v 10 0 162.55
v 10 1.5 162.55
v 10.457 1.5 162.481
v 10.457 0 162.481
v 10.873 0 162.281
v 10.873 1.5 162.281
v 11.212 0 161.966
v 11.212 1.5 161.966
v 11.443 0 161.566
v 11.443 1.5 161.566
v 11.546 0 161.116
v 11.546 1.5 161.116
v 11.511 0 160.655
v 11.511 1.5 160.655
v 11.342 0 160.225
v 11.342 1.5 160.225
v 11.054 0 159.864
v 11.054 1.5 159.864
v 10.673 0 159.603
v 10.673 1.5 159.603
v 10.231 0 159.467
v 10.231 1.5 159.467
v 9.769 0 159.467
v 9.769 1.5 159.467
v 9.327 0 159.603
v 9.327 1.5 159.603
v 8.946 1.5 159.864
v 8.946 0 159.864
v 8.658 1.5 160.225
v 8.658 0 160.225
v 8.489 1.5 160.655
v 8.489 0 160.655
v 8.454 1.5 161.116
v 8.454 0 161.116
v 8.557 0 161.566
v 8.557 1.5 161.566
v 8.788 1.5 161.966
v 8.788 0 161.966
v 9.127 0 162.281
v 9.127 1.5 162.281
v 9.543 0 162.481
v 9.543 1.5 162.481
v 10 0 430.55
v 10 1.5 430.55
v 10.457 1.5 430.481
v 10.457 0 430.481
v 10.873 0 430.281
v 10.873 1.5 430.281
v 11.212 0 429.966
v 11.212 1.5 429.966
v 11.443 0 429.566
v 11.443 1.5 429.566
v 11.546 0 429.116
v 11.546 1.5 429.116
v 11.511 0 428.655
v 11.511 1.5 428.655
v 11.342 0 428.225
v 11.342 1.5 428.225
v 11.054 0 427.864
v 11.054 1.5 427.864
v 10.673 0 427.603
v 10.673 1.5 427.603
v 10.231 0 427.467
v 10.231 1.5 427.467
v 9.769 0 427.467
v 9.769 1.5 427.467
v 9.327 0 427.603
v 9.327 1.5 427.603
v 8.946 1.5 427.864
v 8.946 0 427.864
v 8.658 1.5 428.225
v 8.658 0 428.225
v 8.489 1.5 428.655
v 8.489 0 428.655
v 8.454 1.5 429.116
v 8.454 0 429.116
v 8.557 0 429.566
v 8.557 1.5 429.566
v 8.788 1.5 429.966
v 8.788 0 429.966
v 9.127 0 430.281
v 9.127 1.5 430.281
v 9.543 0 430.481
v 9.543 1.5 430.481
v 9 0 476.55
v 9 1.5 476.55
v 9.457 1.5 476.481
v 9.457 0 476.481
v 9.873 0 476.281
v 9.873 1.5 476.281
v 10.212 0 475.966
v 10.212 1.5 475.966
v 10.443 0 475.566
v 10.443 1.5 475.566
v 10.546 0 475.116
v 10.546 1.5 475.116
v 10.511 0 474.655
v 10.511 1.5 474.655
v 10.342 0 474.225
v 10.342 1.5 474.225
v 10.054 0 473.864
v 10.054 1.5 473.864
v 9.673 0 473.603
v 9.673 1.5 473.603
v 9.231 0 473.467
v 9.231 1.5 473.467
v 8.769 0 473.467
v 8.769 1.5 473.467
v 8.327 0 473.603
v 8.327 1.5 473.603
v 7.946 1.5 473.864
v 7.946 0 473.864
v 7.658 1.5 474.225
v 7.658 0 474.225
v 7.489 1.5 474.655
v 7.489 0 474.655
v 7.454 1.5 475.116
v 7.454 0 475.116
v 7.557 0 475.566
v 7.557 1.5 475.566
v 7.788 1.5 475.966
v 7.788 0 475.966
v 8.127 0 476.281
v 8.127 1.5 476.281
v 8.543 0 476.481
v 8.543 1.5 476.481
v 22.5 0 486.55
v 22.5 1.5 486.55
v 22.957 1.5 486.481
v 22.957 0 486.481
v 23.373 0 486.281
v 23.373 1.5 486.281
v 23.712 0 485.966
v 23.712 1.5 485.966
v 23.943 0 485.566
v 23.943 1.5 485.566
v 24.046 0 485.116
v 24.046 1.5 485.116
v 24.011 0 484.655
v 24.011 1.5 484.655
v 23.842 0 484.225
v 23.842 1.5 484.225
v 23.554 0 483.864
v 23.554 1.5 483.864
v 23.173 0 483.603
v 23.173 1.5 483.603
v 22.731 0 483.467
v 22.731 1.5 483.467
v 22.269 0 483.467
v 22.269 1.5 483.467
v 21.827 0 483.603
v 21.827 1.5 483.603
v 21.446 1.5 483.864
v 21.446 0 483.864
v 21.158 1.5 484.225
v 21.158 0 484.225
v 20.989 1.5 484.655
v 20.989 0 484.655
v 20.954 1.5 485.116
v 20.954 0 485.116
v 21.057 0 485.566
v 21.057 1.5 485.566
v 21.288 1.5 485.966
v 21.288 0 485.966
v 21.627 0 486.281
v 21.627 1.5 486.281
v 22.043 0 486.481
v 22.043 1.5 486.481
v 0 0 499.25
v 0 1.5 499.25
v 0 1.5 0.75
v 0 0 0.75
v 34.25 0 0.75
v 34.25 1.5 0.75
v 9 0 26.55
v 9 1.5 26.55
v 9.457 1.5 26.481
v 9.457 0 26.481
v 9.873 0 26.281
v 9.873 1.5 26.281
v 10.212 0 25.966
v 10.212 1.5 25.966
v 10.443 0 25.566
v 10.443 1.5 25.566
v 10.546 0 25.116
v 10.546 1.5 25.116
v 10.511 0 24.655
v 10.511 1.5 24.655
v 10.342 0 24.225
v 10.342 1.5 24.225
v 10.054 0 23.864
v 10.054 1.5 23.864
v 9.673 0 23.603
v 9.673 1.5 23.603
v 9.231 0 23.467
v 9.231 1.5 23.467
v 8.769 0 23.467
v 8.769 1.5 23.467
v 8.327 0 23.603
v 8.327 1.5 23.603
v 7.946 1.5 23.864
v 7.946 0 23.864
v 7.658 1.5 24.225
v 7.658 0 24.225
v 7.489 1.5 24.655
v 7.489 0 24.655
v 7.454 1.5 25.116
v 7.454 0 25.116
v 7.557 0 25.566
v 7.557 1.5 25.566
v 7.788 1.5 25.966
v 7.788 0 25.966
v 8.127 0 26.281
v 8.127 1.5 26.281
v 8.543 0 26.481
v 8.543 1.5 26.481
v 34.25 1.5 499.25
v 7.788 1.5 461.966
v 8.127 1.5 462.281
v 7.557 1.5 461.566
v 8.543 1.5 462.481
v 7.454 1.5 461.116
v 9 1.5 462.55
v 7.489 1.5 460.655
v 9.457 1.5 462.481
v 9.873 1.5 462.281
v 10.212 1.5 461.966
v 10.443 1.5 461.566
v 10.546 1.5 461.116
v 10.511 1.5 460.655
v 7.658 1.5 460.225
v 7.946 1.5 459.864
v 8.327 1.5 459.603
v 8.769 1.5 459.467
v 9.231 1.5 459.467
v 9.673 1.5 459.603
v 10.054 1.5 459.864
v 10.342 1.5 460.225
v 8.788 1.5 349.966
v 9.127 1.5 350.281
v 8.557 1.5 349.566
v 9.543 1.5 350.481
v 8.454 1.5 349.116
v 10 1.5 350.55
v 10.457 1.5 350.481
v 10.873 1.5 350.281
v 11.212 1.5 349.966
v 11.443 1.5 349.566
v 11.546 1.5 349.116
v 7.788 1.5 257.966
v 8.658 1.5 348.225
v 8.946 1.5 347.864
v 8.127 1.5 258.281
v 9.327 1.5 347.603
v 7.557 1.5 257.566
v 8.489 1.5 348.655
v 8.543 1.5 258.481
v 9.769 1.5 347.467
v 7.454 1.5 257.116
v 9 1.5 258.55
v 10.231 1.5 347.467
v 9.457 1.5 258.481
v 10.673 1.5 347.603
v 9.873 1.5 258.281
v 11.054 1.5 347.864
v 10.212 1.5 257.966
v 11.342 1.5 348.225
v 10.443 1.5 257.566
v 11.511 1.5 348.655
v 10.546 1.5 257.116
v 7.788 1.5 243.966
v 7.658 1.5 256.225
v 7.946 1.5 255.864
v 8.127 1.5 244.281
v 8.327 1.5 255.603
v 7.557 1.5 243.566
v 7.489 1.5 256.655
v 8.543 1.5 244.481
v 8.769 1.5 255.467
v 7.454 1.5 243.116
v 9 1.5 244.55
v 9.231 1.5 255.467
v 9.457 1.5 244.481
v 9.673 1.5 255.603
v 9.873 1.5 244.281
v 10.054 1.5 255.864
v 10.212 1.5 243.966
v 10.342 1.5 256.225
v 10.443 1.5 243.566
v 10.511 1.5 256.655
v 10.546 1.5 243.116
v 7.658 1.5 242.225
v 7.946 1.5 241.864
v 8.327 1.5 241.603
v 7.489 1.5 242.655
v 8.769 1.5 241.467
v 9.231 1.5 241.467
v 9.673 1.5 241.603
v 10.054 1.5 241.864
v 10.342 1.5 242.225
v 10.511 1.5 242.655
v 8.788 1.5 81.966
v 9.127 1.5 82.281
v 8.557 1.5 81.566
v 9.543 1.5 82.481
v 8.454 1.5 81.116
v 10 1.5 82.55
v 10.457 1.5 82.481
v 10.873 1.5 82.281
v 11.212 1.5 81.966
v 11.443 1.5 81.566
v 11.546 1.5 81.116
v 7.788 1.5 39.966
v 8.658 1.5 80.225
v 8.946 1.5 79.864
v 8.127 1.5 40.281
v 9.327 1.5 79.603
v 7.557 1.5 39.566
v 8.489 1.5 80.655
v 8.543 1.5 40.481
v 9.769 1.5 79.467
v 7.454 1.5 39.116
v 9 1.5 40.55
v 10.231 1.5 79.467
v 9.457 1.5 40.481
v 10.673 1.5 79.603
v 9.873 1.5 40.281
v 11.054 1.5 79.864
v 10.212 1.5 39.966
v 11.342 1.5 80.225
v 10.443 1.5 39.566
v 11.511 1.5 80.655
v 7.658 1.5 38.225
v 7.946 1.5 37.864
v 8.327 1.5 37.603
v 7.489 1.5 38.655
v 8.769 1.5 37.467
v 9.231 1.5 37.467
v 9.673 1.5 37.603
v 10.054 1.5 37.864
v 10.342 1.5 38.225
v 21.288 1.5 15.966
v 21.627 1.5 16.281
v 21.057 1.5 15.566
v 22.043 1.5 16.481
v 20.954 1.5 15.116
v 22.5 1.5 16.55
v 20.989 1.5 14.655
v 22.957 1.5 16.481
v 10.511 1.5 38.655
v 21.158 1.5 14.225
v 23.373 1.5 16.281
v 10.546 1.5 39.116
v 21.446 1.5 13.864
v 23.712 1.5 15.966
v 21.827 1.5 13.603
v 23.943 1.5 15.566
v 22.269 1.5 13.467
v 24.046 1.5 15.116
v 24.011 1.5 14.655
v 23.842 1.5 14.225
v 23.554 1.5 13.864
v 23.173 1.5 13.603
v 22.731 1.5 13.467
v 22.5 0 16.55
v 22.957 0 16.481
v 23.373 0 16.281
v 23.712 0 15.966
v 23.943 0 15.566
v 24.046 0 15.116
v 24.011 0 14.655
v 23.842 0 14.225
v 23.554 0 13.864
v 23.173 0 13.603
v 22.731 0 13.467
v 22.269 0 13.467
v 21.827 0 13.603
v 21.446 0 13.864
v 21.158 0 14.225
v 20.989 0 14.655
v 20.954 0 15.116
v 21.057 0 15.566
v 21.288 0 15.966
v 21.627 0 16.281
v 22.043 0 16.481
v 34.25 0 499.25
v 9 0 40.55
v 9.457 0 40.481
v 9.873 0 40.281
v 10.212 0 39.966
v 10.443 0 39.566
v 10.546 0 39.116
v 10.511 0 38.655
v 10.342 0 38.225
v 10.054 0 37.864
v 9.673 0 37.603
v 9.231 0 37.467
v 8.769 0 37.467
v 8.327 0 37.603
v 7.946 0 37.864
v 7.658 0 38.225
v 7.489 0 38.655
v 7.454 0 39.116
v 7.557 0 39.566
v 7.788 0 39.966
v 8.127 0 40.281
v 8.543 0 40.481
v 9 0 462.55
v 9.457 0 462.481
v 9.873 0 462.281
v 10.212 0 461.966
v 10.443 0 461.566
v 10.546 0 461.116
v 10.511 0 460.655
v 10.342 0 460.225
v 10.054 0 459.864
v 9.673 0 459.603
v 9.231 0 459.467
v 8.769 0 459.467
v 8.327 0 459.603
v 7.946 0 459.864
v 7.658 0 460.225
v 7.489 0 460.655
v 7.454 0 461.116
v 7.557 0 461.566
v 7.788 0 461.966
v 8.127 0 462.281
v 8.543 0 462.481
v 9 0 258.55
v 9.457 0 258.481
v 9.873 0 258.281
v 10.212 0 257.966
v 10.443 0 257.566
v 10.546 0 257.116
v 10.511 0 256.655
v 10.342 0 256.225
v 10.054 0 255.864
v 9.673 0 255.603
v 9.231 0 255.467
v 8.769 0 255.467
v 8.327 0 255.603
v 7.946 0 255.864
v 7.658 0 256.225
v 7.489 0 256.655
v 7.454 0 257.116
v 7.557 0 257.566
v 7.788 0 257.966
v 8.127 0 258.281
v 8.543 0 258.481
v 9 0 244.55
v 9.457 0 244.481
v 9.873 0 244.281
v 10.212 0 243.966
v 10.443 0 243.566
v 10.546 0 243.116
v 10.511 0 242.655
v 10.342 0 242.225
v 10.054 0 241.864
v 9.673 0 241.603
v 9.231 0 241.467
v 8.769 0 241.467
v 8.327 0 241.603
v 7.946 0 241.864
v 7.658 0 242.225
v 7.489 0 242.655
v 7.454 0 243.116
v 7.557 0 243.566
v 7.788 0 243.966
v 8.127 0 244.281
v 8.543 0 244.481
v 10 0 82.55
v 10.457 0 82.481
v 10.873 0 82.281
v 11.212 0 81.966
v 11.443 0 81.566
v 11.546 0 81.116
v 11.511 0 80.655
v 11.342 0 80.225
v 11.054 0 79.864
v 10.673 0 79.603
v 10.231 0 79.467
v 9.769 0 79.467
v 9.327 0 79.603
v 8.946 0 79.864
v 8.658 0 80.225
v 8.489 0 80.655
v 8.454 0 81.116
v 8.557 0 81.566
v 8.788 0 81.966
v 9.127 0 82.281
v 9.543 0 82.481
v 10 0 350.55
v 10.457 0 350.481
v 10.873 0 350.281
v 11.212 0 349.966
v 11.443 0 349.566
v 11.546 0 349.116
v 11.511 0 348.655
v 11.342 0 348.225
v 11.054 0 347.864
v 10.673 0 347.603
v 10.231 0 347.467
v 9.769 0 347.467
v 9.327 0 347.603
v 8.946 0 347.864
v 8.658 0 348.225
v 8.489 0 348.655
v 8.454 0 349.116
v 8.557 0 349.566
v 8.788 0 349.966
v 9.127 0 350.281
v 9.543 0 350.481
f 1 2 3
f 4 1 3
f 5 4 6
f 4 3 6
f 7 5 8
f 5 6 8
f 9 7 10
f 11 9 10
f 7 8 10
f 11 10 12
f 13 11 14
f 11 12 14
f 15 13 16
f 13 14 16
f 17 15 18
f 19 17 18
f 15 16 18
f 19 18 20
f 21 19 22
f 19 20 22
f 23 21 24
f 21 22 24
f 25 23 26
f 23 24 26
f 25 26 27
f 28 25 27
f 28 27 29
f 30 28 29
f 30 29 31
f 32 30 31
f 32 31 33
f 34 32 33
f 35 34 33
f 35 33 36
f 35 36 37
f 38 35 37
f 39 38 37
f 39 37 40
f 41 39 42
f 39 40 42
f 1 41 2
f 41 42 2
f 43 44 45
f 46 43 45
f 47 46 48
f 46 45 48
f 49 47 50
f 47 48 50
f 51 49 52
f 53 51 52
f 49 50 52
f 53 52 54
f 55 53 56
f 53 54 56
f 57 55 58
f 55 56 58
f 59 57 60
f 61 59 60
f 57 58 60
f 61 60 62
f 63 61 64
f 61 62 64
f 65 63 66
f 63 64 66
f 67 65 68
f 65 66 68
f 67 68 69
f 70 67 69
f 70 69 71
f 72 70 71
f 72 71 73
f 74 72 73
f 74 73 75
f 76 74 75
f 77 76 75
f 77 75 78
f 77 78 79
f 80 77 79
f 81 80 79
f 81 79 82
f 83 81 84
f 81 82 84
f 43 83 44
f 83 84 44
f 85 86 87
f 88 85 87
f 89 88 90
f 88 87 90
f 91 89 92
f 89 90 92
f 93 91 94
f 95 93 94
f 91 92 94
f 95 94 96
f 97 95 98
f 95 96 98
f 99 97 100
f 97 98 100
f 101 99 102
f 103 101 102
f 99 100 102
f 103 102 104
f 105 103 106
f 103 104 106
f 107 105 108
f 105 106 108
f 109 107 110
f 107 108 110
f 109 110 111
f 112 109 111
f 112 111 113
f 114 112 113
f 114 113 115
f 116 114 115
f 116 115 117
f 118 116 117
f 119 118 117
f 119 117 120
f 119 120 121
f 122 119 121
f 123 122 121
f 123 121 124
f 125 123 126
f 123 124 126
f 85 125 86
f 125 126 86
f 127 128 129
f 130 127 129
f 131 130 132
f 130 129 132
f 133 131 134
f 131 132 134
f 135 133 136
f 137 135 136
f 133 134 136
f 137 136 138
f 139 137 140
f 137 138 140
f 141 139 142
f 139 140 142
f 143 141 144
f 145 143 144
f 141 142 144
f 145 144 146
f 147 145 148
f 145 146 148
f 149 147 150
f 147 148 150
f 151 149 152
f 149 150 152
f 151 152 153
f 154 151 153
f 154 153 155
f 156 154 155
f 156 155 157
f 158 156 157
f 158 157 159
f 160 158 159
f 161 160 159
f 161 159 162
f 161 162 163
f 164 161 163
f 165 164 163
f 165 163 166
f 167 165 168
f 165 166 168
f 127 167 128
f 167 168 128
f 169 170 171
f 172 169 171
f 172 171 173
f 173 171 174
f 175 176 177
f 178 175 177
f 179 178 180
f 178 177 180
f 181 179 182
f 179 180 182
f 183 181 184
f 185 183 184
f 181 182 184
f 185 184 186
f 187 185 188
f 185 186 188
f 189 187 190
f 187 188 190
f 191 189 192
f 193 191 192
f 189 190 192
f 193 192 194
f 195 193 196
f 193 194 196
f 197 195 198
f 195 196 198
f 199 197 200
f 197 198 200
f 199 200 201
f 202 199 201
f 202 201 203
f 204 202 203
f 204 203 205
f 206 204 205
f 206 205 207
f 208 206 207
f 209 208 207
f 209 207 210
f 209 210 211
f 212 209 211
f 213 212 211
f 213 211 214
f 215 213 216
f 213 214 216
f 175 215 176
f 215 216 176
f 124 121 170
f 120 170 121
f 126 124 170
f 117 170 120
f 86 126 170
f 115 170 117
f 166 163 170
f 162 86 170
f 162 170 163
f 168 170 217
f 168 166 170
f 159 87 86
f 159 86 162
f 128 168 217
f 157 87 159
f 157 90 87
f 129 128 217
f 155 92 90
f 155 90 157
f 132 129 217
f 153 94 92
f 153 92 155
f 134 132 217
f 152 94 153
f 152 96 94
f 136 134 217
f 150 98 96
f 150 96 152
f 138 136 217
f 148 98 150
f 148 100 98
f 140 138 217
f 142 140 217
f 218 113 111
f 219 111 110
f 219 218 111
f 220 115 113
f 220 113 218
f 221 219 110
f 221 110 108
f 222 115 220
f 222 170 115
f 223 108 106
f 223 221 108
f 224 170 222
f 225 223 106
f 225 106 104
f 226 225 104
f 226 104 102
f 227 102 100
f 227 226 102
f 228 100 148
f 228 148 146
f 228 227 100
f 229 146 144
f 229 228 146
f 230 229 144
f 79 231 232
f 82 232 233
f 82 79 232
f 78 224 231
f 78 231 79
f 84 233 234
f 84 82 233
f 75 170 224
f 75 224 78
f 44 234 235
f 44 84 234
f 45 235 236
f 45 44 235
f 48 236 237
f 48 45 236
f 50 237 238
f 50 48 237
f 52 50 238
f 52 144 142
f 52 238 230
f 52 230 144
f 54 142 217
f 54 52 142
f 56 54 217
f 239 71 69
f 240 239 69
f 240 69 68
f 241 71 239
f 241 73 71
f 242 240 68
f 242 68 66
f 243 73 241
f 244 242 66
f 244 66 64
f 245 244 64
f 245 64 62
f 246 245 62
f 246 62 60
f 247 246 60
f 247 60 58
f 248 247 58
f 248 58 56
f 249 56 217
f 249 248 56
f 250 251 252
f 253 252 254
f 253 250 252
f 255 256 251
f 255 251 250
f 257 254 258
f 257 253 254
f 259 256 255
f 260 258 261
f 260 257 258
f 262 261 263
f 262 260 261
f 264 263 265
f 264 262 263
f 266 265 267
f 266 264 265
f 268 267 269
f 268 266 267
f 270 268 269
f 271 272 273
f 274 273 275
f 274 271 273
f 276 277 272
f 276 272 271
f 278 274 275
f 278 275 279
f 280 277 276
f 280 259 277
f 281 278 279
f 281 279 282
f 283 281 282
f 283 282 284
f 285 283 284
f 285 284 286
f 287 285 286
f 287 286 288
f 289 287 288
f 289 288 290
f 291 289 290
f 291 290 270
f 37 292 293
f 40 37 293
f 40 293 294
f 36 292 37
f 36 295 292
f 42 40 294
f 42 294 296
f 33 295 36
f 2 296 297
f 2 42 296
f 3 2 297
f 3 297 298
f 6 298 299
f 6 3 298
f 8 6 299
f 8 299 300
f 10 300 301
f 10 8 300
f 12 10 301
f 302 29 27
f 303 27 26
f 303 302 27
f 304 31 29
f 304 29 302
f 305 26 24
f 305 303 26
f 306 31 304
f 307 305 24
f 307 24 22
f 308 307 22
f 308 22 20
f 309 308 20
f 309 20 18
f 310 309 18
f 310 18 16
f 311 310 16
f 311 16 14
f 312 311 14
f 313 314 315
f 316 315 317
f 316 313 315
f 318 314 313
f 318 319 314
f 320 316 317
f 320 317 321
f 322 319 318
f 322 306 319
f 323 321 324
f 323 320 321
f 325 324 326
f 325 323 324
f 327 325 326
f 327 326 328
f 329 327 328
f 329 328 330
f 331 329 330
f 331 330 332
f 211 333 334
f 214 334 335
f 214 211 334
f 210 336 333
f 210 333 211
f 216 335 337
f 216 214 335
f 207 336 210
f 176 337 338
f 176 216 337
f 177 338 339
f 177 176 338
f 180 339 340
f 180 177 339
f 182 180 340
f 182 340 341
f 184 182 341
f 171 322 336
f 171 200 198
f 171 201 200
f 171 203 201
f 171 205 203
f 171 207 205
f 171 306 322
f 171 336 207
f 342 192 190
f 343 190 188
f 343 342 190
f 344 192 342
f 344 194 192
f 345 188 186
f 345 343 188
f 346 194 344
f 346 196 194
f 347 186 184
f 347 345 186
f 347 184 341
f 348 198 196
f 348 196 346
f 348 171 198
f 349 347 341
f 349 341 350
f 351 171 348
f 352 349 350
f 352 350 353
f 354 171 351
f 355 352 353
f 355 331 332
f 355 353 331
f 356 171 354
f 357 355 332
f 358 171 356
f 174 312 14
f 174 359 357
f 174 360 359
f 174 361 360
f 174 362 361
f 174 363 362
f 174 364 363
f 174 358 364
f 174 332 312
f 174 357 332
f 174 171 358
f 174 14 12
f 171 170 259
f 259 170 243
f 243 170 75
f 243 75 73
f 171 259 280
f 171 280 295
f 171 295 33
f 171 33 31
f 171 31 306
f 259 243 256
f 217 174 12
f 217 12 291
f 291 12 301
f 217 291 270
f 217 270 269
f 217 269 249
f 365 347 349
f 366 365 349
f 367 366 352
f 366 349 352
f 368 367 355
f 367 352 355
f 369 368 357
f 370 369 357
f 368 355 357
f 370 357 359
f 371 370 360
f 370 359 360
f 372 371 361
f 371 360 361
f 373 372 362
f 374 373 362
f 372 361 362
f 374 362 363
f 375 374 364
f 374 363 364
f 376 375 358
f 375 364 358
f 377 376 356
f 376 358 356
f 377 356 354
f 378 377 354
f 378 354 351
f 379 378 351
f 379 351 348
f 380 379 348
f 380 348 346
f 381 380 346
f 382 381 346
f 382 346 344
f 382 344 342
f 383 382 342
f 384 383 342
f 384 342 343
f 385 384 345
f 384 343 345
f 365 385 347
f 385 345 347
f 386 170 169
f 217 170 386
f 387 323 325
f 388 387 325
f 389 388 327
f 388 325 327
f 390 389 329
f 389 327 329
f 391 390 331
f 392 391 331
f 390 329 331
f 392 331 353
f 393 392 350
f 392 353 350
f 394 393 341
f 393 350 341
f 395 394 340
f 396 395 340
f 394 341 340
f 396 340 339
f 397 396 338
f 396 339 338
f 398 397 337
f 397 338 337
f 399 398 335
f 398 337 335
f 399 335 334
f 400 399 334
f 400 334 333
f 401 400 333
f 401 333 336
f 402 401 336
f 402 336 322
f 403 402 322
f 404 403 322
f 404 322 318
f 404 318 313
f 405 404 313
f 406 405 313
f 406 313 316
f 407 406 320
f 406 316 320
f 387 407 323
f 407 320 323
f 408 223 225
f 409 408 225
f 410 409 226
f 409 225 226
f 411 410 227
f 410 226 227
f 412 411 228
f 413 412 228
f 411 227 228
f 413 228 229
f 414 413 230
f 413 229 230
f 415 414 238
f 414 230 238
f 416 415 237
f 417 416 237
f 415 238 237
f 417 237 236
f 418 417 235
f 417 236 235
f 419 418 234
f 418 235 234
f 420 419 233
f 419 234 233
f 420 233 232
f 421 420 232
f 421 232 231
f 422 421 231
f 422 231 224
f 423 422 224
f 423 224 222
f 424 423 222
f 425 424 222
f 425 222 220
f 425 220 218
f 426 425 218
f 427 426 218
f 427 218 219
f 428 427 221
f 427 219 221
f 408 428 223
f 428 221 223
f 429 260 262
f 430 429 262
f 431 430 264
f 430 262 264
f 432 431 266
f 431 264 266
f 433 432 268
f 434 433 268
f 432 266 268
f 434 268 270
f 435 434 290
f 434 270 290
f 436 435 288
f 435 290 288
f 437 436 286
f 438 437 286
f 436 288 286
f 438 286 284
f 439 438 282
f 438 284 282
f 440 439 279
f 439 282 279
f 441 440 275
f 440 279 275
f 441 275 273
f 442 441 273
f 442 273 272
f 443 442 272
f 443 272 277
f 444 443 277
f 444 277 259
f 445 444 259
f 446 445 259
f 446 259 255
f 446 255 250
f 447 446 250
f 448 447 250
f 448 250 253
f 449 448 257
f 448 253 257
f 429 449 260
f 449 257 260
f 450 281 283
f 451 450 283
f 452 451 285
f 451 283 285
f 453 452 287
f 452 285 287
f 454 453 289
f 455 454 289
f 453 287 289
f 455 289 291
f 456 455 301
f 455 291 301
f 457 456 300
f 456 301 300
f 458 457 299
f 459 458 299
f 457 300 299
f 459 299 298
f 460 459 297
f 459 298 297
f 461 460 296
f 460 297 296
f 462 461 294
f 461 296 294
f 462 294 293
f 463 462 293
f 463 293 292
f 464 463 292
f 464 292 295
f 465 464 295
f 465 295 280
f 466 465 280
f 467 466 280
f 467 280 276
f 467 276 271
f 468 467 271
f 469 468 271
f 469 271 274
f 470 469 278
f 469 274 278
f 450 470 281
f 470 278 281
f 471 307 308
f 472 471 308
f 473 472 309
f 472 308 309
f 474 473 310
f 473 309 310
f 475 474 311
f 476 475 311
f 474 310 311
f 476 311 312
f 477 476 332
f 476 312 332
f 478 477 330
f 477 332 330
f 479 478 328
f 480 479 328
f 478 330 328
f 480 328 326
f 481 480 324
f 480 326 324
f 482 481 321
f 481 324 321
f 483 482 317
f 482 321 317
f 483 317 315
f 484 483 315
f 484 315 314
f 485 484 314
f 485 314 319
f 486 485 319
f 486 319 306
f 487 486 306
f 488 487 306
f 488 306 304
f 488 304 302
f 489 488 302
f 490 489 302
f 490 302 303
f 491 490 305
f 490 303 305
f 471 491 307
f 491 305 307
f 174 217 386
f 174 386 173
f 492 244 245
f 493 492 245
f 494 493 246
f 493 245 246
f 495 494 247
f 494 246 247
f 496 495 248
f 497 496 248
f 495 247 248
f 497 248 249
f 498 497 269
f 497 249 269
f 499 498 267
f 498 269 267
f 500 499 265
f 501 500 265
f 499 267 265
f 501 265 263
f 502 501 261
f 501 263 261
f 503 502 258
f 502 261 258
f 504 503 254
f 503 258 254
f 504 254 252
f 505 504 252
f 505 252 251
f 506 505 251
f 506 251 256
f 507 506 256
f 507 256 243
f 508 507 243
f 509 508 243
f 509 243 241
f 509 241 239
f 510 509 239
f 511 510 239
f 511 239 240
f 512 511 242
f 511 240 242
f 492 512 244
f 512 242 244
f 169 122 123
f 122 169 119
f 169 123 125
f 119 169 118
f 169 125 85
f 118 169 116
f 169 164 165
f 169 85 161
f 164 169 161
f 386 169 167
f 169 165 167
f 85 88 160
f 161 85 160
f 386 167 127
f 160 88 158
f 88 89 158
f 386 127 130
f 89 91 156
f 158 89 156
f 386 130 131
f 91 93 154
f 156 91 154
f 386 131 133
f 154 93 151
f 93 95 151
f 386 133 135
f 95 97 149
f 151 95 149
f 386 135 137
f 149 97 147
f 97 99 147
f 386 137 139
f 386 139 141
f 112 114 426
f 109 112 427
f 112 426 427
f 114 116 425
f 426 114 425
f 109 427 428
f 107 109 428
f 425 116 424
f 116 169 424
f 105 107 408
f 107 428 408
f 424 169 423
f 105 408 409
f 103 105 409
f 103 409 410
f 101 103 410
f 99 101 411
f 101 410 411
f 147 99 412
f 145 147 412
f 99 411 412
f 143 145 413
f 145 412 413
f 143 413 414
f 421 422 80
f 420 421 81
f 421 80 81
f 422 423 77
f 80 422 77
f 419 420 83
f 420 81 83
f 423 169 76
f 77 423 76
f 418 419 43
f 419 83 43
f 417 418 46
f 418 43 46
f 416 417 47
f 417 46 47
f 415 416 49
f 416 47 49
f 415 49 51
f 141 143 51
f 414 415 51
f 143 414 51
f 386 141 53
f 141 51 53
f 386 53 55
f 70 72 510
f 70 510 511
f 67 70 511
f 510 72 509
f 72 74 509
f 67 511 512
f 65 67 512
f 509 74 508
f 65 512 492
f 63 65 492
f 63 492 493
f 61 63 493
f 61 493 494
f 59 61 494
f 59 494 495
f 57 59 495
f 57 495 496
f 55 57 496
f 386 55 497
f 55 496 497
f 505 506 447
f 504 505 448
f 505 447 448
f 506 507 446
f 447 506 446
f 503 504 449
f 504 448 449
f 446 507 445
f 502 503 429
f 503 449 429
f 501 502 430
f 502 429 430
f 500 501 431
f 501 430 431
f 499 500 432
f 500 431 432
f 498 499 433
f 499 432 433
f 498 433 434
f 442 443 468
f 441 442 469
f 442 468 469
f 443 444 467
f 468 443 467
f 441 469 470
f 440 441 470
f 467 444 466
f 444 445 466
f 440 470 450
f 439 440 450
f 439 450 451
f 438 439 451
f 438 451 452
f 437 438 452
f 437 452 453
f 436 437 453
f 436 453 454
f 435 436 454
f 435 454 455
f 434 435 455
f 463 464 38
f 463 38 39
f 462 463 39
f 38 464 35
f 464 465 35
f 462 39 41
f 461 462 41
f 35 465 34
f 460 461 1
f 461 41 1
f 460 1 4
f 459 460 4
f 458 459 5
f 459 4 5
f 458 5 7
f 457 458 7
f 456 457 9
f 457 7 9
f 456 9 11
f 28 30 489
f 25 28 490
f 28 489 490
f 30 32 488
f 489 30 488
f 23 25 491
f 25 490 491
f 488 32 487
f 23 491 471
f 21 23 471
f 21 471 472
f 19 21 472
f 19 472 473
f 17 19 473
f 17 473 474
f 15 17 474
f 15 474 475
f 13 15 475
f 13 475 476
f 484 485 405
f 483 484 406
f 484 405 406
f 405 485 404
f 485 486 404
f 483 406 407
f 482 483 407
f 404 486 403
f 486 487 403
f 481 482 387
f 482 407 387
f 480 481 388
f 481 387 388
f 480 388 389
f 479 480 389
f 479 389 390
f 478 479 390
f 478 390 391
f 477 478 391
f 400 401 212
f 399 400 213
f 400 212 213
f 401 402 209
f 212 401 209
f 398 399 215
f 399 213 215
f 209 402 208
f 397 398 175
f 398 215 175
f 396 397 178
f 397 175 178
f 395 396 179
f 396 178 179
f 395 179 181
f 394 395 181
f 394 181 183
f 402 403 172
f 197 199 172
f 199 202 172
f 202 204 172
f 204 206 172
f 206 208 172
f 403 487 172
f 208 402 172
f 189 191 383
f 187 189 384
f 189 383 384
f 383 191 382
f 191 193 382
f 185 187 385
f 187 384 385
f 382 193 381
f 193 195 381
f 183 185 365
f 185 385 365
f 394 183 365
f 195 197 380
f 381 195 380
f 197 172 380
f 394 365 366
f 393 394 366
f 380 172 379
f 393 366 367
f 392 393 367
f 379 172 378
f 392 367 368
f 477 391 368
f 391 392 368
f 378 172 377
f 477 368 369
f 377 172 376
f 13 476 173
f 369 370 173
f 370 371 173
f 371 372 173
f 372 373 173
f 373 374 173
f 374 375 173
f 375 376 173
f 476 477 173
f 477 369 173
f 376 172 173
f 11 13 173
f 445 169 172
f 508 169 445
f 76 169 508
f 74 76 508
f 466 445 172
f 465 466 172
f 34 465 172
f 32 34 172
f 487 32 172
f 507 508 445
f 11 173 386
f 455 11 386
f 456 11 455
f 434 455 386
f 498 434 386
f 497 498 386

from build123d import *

# Parameters (mm, degrees)
CROQUIS1_W              = 35
CROQUIS1_H              = 500
SALIENTE_EXTRUIR1_DEPTH = 1.5
CROQUIS2_R              = 1.55
CORTAR_EXTRUIR1_DEPTH   = 1.5
CROQUIS3_R              = 1.55
CORTAR_EXTRUIR2_DEPTH   = 1.5
CROQUIS5_R              = 1.55
CORTAR_EXTRUIR3_DEPTH   = 1.5
CROQUIS6_OUTSIDE_W      = 137.246
CROQUIS6_OUTSIDE_H      = 602.246
CROQUIS6_OUTSIDE_W_2    = 33.5
CROQUIS6_OUTSIDE_H_2    = 498.5
CORTAR_EXTRUIR4_DEPTH   = 1.5
CROQUIS7_W              = 0.75
CROQUIS7_H              = 498.5
SALIENTE_EXTRUIR2_DEPTH = 1.5


with BuildPart() as part:
    # Croquis1 → Saliente-Extruir1 (new body)
    with BuildSketch(Plane(origin=(0, 0, 0), x_dir=(1, 0, 0), z_dir=(0, 1, 0))):
        with Locations((17.5, -250)):
            Rectangle(CROQUIS1_W, CROQUIS1_H)
    extrude(amount=SALIENTE_EXTRUIR1_DEPTH)

    # Croquis2 → Cortar-Extruir1 (cut)
    with BuildSketch(Plane(origin=(0, 1.5, 0), x_dir=(1, 0, 0), z_dir=(0, 1, 0))):
        with Locations(Location((22.5, -15, 0), (0, 0, 270))):
            Circle(CROQUIS2_R)
        with Locations(Location((22.5, -485, 0), (0, 0, 270))):
            Circle(CROQUIS2_R)
    extrude(amount=-CORTAR_EXTRUIR1_DEPTH, mode=Mode.SUBTRACT)

    # Croquis3 → Cortar-Extruir2 (cut)
    with BuildSketch(Plane(origin=(0, 1.5, 0), x_dir=(1, 0, 0), z_dir=(0, 1, 0))):
        with Locations(Location((9, -25, 0), (0, 0, 270))):
            Circle(CROQUIS3_R)
        with Locations(Location((9, -39, 0), (0, 0, 270))):
            Circle(CROQUIS3_R)
        with Locations(Location((9, -475, 0), (0, 0, 270))):
            Circle(CROQUIS3_R)
        with Locations(Location((9, -461, 0), (0, 0, 270))):
            Circle(CROQUIS3_R)
        with Locations(Location((9, -243, 0), (0, 0, 270))):
            Circle(CROQUIS3_R)
        with Locations(Location((9, -257, 0), (0, 0, 270))):
            Circle(CROQUIS3_R)
    extrude(amount=-CORTAR_EXTRUIR2_DEPTH, mode=Mode.SUBTRACT)

    # Croquis5 → Cortar-Extruir3 (cut)
    with BuildSketch(Plane(origin=(0, 1.5, 0), x_dir=(1, 0, 0), z_dir=(0, 1, 0))):
        with Locations(Location((10, -81, 0), (0, 0, 270))):
            Circle(CROQUIS5_R)
        with Locations(Location((10, -161, 0), (0, 0, 270))):
            Circle(CROQUIS5_R)
        with Locations(Location((10, -349, 0), (0, 0, 270))):
            Circle(CROQUIS5_R)
        with Locations(Location((10, -429, 0), (0, 0, 270))):
            Circle(CROQUIS5_R)
    extrude(amount=-CORTAR_EXTRUIR3_DEPTH, mode=Mode.SUBTRACT)

    # Croquis6 outside → Cortar-Extruir4 (cut)
    with BuildSketch(Plane(origin=(0, 1.5, 0), x_dir=(1, 0, 0), z_dir=(0, 1, 0))):
        with Locations((17.5, -250)):
            Rectangle(CROQUIS6_OUTSIDE_W, CROQUIS6_OUTSIDE_H)
        with Locations((17.5, -250)):
            Rectangle(CROQUIS6_OUTSIDE_W_2, CROQUIS6_OUTSIDE_H_2, mode=Mode.SUBTRACT)
    extrude(amount=-CORTAR_EXTRUIR4_DEPTH, mode=Mode.SUBTRACT)

    # Croquis7 → Saliente-Extruir2 (add)
    with BuildSketch(Plane(origin=(0, 1.5, 0), x_dir=(1, 0, 0), z_dir=(0, 1, 0))):
        with Locations((0.375, -250)):
            Rectangle(CROQUIS7_W, CROQUIS7_H)
    extrude(amount=-SALIENTE_EXTRUIR2_DEPTH)


solid = part.part
